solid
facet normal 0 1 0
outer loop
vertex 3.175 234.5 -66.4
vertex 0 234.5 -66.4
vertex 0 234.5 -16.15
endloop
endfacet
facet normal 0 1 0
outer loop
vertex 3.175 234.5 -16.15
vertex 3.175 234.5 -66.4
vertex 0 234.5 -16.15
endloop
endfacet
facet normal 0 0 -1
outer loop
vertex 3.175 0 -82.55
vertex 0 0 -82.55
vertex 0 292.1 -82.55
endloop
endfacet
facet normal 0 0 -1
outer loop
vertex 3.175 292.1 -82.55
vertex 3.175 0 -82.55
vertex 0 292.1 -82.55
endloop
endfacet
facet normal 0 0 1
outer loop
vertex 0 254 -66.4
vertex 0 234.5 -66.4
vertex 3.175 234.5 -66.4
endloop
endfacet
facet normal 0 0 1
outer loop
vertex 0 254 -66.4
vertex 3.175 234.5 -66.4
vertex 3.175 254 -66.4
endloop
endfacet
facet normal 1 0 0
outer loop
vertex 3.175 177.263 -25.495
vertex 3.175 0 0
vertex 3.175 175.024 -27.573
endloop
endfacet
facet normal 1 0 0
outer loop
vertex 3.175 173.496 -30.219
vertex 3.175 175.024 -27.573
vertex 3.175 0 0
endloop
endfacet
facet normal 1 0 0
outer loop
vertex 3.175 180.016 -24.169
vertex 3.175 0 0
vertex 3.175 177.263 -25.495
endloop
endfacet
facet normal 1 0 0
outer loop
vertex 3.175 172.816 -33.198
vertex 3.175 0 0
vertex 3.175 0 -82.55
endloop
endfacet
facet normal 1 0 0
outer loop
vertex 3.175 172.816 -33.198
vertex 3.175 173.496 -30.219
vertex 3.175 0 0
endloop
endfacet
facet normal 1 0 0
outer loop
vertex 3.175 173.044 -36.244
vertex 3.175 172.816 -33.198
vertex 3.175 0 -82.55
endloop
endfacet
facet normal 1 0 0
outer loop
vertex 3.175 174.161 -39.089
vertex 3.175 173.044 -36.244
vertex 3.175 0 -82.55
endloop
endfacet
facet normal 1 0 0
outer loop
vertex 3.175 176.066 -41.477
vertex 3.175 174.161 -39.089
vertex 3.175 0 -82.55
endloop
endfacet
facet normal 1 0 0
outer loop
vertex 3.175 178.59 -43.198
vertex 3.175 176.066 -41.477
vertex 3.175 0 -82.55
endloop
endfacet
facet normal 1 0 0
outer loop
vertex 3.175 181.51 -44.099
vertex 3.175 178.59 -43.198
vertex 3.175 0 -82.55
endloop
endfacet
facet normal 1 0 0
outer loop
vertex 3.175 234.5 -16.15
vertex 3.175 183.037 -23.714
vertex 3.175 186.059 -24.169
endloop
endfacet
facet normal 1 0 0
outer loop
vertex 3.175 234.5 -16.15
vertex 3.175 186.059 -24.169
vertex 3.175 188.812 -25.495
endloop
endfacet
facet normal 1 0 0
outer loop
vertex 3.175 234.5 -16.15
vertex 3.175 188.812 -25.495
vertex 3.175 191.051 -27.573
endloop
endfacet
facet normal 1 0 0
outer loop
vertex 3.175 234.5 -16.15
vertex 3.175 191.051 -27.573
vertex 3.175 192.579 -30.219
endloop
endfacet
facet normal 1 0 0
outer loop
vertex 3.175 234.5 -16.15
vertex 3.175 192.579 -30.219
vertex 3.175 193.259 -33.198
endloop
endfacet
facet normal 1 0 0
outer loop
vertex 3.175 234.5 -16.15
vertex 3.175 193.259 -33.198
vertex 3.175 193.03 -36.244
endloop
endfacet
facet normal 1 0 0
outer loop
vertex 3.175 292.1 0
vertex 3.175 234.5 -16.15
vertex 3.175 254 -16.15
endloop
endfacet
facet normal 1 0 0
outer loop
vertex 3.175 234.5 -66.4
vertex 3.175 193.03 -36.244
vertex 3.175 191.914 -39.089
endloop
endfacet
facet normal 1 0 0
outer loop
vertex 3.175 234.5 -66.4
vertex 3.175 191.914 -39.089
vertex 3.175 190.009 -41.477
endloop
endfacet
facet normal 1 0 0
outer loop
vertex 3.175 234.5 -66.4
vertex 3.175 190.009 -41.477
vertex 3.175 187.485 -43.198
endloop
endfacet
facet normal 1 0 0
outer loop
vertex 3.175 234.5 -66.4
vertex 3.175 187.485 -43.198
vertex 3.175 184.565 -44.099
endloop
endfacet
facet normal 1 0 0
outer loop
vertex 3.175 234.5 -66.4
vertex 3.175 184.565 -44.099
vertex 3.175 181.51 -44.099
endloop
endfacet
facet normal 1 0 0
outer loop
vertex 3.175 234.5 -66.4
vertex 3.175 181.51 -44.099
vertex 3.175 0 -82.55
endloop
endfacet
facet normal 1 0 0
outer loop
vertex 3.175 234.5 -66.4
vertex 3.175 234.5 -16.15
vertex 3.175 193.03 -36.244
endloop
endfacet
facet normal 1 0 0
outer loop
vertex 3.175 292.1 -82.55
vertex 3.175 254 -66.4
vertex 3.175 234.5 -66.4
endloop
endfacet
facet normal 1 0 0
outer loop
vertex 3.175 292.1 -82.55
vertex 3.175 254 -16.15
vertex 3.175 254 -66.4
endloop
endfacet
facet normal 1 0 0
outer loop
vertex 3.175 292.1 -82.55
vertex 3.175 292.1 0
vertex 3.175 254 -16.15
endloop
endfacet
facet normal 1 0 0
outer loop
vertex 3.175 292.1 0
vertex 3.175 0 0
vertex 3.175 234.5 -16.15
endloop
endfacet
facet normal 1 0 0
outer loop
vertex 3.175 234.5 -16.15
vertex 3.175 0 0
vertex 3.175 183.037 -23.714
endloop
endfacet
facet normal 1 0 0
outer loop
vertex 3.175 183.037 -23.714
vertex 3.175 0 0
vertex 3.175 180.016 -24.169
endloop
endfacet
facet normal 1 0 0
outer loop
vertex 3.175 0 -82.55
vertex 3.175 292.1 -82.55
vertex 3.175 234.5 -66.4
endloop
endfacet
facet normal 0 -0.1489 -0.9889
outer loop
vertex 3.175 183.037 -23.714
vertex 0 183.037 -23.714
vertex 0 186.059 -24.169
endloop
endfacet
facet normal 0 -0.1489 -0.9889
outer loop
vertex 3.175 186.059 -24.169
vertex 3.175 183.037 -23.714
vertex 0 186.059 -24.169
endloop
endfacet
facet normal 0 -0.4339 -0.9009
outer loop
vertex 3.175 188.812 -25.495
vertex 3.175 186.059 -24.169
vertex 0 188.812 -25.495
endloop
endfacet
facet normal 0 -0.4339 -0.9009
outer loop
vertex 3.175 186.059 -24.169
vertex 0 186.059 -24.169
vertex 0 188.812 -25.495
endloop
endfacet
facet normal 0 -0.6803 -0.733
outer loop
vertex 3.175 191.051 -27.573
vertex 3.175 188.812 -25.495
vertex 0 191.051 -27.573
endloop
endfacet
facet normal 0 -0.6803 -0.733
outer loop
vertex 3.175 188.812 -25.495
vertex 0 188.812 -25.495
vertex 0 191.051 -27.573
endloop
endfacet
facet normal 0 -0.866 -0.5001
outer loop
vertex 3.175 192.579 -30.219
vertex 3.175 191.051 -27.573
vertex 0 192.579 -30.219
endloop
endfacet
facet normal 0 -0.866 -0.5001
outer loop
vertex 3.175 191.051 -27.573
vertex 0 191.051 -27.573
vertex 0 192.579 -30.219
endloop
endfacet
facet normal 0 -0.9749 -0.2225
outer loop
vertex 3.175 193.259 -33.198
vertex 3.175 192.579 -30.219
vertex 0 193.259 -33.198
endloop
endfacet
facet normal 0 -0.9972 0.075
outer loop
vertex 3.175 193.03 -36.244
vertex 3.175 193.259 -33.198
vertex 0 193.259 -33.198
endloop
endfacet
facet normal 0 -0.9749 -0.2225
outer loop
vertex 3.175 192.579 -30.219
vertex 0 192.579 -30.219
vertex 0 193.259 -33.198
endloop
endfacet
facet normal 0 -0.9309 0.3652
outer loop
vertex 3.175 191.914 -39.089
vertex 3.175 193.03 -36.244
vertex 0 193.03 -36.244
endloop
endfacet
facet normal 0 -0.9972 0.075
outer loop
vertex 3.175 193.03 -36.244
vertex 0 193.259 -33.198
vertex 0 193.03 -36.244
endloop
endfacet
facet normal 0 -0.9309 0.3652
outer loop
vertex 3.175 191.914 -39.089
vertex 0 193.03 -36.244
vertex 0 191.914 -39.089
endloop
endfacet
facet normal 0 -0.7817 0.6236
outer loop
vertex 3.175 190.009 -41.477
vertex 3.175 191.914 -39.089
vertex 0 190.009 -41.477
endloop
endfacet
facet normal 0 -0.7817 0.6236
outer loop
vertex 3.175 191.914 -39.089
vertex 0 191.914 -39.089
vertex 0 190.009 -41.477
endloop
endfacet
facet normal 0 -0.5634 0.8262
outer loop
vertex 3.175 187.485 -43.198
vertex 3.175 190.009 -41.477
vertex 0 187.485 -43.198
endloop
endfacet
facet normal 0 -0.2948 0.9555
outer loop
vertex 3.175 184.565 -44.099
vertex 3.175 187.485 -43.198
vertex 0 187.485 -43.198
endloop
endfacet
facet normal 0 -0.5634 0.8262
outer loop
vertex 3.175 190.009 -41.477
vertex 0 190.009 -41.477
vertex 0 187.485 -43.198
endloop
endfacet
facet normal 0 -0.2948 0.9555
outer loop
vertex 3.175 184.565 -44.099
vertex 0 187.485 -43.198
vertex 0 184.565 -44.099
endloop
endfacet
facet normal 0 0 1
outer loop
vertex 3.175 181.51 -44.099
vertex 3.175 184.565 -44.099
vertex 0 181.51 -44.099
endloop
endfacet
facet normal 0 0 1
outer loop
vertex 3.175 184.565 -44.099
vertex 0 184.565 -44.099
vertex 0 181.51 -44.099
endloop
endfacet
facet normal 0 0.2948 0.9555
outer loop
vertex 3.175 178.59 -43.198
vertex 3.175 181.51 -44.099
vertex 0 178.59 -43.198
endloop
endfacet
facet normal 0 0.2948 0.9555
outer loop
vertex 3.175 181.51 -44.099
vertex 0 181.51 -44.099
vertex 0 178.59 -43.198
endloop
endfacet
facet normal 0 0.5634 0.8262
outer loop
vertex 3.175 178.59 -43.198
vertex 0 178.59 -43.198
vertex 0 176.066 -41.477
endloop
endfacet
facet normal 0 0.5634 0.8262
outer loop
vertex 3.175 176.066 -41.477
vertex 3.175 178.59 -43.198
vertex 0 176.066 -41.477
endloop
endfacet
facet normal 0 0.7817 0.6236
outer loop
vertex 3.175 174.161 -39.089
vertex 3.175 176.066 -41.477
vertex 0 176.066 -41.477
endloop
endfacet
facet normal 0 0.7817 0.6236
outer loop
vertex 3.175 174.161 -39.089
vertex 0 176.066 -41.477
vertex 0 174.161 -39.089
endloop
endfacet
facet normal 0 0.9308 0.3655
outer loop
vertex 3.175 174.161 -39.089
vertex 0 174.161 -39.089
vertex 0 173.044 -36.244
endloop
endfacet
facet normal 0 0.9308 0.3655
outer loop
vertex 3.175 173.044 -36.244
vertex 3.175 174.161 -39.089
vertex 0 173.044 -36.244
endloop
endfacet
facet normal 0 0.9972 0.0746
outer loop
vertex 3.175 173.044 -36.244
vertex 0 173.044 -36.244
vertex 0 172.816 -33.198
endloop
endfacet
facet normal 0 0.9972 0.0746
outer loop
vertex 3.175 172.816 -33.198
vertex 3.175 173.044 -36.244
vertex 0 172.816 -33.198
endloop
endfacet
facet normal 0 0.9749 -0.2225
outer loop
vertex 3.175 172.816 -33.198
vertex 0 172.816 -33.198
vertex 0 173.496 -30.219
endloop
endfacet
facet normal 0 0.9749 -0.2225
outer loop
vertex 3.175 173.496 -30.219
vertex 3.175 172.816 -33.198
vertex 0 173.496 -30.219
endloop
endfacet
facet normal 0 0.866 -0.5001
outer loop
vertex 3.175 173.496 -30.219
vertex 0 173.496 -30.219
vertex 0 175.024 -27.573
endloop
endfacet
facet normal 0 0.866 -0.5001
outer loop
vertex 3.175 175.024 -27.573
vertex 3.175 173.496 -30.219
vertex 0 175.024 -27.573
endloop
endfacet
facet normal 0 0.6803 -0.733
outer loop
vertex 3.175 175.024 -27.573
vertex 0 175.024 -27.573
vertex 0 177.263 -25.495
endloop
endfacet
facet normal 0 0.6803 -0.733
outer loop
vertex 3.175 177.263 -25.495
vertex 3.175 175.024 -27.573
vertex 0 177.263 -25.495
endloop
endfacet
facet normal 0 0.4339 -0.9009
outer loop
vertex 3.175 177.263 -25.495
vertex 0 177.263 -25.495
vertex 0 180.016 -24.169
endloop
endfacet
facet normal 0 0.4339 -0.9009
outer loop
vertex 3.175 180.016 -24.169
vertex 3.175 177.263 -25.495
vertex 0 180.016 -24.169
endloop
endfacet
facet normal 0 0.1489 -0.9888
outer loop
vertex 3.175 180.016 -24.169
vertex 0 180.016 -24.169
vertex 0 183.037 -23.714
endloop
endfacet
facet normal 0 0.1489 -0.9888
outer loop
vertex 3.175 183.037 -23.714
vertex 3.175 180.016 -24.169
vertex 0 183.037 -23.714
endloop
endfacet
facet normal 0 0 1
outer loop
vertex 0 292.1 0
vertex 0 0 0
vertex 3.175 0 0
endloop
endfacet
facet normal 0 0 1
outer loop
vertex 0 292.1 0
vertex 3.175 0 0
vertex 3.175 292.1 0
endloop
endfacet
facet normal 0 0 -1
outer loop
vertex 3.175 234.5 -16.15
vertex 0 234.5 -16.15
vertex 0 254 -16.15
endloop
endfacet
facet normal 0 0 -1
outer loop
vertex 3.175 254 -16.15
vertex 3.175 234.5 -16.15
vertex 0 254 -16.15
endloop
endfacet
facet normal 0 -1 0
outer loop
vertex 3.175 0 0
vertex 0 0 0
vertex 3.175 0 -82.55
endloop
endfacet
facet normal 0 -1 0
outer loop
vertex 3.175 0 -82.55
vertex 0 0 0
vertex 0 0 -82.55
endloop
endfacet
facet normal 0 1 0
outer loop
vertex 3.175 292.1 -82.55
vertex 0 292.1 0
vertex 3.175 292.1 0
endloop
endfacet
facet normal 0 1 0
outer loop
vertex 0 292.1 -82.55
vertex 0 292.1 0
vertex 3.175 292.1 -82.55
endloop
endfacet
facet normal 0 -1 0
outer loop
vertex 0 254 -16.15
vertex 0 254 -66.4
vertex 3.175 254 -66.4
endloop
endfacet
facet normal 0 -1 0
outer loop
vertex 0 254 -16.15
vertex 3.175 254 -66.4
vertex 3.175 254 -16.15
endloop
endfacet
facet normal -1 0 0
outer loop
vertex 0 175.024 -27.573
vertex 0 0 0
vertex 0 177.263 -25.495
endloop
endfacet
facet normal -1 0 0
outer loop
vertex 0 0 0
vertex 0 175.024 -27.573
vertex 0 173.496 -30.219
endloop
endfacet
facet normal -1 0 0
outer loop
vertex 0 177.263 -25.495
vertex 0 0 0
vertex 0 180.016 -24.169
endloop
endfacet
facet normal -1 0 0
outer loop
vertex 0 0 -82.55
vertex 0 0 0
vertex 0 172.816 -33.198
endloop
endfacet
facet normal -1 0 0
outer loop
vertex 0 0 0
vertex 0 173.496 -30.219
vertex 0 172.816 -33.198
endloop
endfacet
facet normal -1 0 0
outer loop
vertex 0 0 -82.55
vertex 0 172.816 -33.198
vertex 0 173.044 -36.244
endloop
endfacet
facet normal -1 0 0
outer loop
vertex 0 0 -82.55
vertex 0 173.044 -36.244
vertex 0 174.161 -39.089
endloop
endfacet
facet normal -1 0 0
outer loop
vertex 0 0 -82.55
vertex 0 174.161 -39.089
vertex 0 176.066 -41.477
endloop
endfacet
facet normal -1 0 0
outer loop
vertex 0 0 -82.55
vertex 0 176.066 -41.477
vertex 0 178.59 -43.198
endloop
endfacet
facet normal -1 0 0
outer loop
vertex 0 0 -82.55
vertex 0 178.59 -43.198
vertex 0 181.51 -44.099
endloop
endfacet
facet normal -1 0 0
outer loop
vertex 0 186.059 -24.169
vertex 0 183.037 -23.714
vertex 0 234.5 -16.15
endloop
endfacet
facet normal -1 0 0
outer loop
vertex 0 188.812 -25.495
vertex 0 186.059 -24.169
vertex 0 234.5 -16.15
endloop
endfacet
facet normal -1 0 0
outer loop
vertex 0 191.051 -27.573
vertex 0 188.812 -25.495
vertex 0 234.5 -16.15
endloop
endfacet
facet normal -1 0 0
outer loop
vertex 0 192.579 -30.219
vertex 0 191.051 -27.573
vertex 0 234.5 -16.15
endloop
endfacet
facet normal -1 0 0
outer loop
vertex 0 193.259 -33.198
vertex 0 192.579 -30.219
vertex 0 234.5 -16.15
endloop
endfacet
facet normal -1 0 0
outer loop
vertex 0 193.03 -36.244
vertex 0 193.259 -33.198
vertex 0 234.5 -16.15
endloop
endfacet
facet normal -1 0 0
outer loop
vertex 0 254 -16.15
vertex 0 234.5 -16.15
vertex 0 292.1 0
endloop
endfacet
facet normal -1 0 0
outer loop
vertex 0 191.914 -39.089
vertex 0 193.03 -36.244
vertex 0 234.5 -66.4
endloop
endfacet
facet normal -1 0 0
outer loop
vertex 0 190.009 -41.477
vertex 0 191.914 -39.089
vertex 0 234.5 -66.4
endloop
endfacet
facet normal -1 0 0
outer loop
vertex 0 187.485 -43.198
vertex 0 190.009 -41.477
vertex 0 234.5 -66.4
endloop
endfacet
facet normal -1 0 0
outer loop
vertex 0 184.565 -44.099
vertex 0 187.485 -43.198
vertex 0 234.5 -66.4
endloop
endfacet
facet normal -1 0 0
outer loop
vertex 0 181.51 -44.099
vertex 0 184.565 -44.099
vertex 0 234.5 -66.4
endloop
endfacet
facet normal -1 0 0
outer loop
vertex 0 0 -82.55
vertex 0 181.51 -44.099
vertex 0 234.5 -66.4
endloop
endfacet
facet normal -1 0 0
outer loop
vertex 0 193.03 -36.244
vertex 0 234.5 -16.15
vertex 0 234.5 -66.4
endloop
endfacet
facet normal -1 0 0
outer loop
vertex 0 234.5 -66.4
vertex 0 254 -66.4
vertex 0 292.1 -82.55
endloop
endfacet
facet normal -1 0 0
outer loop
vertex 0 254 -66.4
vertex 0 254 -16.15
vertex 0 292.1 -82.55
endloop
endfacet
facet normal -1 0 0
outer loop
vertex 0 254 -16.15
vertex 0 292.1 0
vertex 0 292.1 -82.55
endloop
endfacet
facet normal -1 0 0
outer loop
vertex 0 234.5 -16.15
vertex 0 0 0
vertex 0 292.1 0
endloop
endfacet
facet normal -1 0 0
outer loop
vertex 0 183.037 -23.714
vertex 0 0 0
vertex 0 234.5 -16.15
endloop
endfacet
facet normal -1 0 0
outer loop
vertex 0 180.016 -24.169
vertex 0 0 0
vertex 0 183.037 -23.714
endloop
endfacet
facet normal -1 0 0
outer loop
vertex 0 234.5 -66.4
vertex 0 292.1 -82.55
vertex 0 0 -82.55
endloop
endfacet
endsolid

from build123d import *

# Parameters (mm, degrees)
SKETCH1_W           = 82.55
SKETCH1_H           = 292.1
BOSS_EXTRUDE1_DEPTH = 3.175
CUT_EXTRUDE1_REACH  = 305.557
SKETCH2_W           = 50.25
SKETCH2_H           = 19.5
CUT_EXTRUDE2_REACH  = 305.557
SKETCH4_R           = 10.25


with BuildPart() as part:
    # Sketch1 → Boss-Extrude1 (new body)
    with BuildSketch(Plane(origin=(0, 0, 0), x_dir=(0, 0, -1), z_dir=(1, 0, 0))):
        with Locations((41.275, 146.05)):
            Rectangle(SKETCH1_W, SKETCH1_H)
    extrude(amount=BOSS_EXTRUDE1_DEPTH)

    # Sketch2 → Cut-Extrude1 (cut, up to next)
    with BuildSketch(Plane.ZY, mode=Mode.PRIVATE) as cut_extrude1_sk1:
        with Locations((-41.275, 244.25)):
            Rectangle(SKETCH2_W, SKETCH2_H)
    cut_extrude1_tool1 = extrude(cut_extrude1_sk1.sketch, amount=-CUT_EXTRUDE1_REACH, mode=Mode.PRIVATE) & part.part
    add(cut_extrude1_tool1.solids().sort_by_distance((0, 244.25, -41.275))[0], mode=Mode.SUBTRACT)

    # Sketch4 → Cut-Extrude2 (cut, up to next)
    with BuildSketch(Plane.ZY, mode=Mode.PRIVATE) as cut_extrude2_sk1:
        with Locations((-33.963522547, 183.037474176)):
            Circle(SKETCH4_R)
    cut_extrude2_tool1 = extrude(cut_extrude2_sk1.sketch, amount=-CUT_EXTRUDE2_REACH, mode=Mode.PRIVATE) & part.part
    add(cut_extrude2_tool1.solids().sort_by_distance((0, 183.037474, -33.963523))[0], mode=Mode.SUBTRACT)


solid = part.part
